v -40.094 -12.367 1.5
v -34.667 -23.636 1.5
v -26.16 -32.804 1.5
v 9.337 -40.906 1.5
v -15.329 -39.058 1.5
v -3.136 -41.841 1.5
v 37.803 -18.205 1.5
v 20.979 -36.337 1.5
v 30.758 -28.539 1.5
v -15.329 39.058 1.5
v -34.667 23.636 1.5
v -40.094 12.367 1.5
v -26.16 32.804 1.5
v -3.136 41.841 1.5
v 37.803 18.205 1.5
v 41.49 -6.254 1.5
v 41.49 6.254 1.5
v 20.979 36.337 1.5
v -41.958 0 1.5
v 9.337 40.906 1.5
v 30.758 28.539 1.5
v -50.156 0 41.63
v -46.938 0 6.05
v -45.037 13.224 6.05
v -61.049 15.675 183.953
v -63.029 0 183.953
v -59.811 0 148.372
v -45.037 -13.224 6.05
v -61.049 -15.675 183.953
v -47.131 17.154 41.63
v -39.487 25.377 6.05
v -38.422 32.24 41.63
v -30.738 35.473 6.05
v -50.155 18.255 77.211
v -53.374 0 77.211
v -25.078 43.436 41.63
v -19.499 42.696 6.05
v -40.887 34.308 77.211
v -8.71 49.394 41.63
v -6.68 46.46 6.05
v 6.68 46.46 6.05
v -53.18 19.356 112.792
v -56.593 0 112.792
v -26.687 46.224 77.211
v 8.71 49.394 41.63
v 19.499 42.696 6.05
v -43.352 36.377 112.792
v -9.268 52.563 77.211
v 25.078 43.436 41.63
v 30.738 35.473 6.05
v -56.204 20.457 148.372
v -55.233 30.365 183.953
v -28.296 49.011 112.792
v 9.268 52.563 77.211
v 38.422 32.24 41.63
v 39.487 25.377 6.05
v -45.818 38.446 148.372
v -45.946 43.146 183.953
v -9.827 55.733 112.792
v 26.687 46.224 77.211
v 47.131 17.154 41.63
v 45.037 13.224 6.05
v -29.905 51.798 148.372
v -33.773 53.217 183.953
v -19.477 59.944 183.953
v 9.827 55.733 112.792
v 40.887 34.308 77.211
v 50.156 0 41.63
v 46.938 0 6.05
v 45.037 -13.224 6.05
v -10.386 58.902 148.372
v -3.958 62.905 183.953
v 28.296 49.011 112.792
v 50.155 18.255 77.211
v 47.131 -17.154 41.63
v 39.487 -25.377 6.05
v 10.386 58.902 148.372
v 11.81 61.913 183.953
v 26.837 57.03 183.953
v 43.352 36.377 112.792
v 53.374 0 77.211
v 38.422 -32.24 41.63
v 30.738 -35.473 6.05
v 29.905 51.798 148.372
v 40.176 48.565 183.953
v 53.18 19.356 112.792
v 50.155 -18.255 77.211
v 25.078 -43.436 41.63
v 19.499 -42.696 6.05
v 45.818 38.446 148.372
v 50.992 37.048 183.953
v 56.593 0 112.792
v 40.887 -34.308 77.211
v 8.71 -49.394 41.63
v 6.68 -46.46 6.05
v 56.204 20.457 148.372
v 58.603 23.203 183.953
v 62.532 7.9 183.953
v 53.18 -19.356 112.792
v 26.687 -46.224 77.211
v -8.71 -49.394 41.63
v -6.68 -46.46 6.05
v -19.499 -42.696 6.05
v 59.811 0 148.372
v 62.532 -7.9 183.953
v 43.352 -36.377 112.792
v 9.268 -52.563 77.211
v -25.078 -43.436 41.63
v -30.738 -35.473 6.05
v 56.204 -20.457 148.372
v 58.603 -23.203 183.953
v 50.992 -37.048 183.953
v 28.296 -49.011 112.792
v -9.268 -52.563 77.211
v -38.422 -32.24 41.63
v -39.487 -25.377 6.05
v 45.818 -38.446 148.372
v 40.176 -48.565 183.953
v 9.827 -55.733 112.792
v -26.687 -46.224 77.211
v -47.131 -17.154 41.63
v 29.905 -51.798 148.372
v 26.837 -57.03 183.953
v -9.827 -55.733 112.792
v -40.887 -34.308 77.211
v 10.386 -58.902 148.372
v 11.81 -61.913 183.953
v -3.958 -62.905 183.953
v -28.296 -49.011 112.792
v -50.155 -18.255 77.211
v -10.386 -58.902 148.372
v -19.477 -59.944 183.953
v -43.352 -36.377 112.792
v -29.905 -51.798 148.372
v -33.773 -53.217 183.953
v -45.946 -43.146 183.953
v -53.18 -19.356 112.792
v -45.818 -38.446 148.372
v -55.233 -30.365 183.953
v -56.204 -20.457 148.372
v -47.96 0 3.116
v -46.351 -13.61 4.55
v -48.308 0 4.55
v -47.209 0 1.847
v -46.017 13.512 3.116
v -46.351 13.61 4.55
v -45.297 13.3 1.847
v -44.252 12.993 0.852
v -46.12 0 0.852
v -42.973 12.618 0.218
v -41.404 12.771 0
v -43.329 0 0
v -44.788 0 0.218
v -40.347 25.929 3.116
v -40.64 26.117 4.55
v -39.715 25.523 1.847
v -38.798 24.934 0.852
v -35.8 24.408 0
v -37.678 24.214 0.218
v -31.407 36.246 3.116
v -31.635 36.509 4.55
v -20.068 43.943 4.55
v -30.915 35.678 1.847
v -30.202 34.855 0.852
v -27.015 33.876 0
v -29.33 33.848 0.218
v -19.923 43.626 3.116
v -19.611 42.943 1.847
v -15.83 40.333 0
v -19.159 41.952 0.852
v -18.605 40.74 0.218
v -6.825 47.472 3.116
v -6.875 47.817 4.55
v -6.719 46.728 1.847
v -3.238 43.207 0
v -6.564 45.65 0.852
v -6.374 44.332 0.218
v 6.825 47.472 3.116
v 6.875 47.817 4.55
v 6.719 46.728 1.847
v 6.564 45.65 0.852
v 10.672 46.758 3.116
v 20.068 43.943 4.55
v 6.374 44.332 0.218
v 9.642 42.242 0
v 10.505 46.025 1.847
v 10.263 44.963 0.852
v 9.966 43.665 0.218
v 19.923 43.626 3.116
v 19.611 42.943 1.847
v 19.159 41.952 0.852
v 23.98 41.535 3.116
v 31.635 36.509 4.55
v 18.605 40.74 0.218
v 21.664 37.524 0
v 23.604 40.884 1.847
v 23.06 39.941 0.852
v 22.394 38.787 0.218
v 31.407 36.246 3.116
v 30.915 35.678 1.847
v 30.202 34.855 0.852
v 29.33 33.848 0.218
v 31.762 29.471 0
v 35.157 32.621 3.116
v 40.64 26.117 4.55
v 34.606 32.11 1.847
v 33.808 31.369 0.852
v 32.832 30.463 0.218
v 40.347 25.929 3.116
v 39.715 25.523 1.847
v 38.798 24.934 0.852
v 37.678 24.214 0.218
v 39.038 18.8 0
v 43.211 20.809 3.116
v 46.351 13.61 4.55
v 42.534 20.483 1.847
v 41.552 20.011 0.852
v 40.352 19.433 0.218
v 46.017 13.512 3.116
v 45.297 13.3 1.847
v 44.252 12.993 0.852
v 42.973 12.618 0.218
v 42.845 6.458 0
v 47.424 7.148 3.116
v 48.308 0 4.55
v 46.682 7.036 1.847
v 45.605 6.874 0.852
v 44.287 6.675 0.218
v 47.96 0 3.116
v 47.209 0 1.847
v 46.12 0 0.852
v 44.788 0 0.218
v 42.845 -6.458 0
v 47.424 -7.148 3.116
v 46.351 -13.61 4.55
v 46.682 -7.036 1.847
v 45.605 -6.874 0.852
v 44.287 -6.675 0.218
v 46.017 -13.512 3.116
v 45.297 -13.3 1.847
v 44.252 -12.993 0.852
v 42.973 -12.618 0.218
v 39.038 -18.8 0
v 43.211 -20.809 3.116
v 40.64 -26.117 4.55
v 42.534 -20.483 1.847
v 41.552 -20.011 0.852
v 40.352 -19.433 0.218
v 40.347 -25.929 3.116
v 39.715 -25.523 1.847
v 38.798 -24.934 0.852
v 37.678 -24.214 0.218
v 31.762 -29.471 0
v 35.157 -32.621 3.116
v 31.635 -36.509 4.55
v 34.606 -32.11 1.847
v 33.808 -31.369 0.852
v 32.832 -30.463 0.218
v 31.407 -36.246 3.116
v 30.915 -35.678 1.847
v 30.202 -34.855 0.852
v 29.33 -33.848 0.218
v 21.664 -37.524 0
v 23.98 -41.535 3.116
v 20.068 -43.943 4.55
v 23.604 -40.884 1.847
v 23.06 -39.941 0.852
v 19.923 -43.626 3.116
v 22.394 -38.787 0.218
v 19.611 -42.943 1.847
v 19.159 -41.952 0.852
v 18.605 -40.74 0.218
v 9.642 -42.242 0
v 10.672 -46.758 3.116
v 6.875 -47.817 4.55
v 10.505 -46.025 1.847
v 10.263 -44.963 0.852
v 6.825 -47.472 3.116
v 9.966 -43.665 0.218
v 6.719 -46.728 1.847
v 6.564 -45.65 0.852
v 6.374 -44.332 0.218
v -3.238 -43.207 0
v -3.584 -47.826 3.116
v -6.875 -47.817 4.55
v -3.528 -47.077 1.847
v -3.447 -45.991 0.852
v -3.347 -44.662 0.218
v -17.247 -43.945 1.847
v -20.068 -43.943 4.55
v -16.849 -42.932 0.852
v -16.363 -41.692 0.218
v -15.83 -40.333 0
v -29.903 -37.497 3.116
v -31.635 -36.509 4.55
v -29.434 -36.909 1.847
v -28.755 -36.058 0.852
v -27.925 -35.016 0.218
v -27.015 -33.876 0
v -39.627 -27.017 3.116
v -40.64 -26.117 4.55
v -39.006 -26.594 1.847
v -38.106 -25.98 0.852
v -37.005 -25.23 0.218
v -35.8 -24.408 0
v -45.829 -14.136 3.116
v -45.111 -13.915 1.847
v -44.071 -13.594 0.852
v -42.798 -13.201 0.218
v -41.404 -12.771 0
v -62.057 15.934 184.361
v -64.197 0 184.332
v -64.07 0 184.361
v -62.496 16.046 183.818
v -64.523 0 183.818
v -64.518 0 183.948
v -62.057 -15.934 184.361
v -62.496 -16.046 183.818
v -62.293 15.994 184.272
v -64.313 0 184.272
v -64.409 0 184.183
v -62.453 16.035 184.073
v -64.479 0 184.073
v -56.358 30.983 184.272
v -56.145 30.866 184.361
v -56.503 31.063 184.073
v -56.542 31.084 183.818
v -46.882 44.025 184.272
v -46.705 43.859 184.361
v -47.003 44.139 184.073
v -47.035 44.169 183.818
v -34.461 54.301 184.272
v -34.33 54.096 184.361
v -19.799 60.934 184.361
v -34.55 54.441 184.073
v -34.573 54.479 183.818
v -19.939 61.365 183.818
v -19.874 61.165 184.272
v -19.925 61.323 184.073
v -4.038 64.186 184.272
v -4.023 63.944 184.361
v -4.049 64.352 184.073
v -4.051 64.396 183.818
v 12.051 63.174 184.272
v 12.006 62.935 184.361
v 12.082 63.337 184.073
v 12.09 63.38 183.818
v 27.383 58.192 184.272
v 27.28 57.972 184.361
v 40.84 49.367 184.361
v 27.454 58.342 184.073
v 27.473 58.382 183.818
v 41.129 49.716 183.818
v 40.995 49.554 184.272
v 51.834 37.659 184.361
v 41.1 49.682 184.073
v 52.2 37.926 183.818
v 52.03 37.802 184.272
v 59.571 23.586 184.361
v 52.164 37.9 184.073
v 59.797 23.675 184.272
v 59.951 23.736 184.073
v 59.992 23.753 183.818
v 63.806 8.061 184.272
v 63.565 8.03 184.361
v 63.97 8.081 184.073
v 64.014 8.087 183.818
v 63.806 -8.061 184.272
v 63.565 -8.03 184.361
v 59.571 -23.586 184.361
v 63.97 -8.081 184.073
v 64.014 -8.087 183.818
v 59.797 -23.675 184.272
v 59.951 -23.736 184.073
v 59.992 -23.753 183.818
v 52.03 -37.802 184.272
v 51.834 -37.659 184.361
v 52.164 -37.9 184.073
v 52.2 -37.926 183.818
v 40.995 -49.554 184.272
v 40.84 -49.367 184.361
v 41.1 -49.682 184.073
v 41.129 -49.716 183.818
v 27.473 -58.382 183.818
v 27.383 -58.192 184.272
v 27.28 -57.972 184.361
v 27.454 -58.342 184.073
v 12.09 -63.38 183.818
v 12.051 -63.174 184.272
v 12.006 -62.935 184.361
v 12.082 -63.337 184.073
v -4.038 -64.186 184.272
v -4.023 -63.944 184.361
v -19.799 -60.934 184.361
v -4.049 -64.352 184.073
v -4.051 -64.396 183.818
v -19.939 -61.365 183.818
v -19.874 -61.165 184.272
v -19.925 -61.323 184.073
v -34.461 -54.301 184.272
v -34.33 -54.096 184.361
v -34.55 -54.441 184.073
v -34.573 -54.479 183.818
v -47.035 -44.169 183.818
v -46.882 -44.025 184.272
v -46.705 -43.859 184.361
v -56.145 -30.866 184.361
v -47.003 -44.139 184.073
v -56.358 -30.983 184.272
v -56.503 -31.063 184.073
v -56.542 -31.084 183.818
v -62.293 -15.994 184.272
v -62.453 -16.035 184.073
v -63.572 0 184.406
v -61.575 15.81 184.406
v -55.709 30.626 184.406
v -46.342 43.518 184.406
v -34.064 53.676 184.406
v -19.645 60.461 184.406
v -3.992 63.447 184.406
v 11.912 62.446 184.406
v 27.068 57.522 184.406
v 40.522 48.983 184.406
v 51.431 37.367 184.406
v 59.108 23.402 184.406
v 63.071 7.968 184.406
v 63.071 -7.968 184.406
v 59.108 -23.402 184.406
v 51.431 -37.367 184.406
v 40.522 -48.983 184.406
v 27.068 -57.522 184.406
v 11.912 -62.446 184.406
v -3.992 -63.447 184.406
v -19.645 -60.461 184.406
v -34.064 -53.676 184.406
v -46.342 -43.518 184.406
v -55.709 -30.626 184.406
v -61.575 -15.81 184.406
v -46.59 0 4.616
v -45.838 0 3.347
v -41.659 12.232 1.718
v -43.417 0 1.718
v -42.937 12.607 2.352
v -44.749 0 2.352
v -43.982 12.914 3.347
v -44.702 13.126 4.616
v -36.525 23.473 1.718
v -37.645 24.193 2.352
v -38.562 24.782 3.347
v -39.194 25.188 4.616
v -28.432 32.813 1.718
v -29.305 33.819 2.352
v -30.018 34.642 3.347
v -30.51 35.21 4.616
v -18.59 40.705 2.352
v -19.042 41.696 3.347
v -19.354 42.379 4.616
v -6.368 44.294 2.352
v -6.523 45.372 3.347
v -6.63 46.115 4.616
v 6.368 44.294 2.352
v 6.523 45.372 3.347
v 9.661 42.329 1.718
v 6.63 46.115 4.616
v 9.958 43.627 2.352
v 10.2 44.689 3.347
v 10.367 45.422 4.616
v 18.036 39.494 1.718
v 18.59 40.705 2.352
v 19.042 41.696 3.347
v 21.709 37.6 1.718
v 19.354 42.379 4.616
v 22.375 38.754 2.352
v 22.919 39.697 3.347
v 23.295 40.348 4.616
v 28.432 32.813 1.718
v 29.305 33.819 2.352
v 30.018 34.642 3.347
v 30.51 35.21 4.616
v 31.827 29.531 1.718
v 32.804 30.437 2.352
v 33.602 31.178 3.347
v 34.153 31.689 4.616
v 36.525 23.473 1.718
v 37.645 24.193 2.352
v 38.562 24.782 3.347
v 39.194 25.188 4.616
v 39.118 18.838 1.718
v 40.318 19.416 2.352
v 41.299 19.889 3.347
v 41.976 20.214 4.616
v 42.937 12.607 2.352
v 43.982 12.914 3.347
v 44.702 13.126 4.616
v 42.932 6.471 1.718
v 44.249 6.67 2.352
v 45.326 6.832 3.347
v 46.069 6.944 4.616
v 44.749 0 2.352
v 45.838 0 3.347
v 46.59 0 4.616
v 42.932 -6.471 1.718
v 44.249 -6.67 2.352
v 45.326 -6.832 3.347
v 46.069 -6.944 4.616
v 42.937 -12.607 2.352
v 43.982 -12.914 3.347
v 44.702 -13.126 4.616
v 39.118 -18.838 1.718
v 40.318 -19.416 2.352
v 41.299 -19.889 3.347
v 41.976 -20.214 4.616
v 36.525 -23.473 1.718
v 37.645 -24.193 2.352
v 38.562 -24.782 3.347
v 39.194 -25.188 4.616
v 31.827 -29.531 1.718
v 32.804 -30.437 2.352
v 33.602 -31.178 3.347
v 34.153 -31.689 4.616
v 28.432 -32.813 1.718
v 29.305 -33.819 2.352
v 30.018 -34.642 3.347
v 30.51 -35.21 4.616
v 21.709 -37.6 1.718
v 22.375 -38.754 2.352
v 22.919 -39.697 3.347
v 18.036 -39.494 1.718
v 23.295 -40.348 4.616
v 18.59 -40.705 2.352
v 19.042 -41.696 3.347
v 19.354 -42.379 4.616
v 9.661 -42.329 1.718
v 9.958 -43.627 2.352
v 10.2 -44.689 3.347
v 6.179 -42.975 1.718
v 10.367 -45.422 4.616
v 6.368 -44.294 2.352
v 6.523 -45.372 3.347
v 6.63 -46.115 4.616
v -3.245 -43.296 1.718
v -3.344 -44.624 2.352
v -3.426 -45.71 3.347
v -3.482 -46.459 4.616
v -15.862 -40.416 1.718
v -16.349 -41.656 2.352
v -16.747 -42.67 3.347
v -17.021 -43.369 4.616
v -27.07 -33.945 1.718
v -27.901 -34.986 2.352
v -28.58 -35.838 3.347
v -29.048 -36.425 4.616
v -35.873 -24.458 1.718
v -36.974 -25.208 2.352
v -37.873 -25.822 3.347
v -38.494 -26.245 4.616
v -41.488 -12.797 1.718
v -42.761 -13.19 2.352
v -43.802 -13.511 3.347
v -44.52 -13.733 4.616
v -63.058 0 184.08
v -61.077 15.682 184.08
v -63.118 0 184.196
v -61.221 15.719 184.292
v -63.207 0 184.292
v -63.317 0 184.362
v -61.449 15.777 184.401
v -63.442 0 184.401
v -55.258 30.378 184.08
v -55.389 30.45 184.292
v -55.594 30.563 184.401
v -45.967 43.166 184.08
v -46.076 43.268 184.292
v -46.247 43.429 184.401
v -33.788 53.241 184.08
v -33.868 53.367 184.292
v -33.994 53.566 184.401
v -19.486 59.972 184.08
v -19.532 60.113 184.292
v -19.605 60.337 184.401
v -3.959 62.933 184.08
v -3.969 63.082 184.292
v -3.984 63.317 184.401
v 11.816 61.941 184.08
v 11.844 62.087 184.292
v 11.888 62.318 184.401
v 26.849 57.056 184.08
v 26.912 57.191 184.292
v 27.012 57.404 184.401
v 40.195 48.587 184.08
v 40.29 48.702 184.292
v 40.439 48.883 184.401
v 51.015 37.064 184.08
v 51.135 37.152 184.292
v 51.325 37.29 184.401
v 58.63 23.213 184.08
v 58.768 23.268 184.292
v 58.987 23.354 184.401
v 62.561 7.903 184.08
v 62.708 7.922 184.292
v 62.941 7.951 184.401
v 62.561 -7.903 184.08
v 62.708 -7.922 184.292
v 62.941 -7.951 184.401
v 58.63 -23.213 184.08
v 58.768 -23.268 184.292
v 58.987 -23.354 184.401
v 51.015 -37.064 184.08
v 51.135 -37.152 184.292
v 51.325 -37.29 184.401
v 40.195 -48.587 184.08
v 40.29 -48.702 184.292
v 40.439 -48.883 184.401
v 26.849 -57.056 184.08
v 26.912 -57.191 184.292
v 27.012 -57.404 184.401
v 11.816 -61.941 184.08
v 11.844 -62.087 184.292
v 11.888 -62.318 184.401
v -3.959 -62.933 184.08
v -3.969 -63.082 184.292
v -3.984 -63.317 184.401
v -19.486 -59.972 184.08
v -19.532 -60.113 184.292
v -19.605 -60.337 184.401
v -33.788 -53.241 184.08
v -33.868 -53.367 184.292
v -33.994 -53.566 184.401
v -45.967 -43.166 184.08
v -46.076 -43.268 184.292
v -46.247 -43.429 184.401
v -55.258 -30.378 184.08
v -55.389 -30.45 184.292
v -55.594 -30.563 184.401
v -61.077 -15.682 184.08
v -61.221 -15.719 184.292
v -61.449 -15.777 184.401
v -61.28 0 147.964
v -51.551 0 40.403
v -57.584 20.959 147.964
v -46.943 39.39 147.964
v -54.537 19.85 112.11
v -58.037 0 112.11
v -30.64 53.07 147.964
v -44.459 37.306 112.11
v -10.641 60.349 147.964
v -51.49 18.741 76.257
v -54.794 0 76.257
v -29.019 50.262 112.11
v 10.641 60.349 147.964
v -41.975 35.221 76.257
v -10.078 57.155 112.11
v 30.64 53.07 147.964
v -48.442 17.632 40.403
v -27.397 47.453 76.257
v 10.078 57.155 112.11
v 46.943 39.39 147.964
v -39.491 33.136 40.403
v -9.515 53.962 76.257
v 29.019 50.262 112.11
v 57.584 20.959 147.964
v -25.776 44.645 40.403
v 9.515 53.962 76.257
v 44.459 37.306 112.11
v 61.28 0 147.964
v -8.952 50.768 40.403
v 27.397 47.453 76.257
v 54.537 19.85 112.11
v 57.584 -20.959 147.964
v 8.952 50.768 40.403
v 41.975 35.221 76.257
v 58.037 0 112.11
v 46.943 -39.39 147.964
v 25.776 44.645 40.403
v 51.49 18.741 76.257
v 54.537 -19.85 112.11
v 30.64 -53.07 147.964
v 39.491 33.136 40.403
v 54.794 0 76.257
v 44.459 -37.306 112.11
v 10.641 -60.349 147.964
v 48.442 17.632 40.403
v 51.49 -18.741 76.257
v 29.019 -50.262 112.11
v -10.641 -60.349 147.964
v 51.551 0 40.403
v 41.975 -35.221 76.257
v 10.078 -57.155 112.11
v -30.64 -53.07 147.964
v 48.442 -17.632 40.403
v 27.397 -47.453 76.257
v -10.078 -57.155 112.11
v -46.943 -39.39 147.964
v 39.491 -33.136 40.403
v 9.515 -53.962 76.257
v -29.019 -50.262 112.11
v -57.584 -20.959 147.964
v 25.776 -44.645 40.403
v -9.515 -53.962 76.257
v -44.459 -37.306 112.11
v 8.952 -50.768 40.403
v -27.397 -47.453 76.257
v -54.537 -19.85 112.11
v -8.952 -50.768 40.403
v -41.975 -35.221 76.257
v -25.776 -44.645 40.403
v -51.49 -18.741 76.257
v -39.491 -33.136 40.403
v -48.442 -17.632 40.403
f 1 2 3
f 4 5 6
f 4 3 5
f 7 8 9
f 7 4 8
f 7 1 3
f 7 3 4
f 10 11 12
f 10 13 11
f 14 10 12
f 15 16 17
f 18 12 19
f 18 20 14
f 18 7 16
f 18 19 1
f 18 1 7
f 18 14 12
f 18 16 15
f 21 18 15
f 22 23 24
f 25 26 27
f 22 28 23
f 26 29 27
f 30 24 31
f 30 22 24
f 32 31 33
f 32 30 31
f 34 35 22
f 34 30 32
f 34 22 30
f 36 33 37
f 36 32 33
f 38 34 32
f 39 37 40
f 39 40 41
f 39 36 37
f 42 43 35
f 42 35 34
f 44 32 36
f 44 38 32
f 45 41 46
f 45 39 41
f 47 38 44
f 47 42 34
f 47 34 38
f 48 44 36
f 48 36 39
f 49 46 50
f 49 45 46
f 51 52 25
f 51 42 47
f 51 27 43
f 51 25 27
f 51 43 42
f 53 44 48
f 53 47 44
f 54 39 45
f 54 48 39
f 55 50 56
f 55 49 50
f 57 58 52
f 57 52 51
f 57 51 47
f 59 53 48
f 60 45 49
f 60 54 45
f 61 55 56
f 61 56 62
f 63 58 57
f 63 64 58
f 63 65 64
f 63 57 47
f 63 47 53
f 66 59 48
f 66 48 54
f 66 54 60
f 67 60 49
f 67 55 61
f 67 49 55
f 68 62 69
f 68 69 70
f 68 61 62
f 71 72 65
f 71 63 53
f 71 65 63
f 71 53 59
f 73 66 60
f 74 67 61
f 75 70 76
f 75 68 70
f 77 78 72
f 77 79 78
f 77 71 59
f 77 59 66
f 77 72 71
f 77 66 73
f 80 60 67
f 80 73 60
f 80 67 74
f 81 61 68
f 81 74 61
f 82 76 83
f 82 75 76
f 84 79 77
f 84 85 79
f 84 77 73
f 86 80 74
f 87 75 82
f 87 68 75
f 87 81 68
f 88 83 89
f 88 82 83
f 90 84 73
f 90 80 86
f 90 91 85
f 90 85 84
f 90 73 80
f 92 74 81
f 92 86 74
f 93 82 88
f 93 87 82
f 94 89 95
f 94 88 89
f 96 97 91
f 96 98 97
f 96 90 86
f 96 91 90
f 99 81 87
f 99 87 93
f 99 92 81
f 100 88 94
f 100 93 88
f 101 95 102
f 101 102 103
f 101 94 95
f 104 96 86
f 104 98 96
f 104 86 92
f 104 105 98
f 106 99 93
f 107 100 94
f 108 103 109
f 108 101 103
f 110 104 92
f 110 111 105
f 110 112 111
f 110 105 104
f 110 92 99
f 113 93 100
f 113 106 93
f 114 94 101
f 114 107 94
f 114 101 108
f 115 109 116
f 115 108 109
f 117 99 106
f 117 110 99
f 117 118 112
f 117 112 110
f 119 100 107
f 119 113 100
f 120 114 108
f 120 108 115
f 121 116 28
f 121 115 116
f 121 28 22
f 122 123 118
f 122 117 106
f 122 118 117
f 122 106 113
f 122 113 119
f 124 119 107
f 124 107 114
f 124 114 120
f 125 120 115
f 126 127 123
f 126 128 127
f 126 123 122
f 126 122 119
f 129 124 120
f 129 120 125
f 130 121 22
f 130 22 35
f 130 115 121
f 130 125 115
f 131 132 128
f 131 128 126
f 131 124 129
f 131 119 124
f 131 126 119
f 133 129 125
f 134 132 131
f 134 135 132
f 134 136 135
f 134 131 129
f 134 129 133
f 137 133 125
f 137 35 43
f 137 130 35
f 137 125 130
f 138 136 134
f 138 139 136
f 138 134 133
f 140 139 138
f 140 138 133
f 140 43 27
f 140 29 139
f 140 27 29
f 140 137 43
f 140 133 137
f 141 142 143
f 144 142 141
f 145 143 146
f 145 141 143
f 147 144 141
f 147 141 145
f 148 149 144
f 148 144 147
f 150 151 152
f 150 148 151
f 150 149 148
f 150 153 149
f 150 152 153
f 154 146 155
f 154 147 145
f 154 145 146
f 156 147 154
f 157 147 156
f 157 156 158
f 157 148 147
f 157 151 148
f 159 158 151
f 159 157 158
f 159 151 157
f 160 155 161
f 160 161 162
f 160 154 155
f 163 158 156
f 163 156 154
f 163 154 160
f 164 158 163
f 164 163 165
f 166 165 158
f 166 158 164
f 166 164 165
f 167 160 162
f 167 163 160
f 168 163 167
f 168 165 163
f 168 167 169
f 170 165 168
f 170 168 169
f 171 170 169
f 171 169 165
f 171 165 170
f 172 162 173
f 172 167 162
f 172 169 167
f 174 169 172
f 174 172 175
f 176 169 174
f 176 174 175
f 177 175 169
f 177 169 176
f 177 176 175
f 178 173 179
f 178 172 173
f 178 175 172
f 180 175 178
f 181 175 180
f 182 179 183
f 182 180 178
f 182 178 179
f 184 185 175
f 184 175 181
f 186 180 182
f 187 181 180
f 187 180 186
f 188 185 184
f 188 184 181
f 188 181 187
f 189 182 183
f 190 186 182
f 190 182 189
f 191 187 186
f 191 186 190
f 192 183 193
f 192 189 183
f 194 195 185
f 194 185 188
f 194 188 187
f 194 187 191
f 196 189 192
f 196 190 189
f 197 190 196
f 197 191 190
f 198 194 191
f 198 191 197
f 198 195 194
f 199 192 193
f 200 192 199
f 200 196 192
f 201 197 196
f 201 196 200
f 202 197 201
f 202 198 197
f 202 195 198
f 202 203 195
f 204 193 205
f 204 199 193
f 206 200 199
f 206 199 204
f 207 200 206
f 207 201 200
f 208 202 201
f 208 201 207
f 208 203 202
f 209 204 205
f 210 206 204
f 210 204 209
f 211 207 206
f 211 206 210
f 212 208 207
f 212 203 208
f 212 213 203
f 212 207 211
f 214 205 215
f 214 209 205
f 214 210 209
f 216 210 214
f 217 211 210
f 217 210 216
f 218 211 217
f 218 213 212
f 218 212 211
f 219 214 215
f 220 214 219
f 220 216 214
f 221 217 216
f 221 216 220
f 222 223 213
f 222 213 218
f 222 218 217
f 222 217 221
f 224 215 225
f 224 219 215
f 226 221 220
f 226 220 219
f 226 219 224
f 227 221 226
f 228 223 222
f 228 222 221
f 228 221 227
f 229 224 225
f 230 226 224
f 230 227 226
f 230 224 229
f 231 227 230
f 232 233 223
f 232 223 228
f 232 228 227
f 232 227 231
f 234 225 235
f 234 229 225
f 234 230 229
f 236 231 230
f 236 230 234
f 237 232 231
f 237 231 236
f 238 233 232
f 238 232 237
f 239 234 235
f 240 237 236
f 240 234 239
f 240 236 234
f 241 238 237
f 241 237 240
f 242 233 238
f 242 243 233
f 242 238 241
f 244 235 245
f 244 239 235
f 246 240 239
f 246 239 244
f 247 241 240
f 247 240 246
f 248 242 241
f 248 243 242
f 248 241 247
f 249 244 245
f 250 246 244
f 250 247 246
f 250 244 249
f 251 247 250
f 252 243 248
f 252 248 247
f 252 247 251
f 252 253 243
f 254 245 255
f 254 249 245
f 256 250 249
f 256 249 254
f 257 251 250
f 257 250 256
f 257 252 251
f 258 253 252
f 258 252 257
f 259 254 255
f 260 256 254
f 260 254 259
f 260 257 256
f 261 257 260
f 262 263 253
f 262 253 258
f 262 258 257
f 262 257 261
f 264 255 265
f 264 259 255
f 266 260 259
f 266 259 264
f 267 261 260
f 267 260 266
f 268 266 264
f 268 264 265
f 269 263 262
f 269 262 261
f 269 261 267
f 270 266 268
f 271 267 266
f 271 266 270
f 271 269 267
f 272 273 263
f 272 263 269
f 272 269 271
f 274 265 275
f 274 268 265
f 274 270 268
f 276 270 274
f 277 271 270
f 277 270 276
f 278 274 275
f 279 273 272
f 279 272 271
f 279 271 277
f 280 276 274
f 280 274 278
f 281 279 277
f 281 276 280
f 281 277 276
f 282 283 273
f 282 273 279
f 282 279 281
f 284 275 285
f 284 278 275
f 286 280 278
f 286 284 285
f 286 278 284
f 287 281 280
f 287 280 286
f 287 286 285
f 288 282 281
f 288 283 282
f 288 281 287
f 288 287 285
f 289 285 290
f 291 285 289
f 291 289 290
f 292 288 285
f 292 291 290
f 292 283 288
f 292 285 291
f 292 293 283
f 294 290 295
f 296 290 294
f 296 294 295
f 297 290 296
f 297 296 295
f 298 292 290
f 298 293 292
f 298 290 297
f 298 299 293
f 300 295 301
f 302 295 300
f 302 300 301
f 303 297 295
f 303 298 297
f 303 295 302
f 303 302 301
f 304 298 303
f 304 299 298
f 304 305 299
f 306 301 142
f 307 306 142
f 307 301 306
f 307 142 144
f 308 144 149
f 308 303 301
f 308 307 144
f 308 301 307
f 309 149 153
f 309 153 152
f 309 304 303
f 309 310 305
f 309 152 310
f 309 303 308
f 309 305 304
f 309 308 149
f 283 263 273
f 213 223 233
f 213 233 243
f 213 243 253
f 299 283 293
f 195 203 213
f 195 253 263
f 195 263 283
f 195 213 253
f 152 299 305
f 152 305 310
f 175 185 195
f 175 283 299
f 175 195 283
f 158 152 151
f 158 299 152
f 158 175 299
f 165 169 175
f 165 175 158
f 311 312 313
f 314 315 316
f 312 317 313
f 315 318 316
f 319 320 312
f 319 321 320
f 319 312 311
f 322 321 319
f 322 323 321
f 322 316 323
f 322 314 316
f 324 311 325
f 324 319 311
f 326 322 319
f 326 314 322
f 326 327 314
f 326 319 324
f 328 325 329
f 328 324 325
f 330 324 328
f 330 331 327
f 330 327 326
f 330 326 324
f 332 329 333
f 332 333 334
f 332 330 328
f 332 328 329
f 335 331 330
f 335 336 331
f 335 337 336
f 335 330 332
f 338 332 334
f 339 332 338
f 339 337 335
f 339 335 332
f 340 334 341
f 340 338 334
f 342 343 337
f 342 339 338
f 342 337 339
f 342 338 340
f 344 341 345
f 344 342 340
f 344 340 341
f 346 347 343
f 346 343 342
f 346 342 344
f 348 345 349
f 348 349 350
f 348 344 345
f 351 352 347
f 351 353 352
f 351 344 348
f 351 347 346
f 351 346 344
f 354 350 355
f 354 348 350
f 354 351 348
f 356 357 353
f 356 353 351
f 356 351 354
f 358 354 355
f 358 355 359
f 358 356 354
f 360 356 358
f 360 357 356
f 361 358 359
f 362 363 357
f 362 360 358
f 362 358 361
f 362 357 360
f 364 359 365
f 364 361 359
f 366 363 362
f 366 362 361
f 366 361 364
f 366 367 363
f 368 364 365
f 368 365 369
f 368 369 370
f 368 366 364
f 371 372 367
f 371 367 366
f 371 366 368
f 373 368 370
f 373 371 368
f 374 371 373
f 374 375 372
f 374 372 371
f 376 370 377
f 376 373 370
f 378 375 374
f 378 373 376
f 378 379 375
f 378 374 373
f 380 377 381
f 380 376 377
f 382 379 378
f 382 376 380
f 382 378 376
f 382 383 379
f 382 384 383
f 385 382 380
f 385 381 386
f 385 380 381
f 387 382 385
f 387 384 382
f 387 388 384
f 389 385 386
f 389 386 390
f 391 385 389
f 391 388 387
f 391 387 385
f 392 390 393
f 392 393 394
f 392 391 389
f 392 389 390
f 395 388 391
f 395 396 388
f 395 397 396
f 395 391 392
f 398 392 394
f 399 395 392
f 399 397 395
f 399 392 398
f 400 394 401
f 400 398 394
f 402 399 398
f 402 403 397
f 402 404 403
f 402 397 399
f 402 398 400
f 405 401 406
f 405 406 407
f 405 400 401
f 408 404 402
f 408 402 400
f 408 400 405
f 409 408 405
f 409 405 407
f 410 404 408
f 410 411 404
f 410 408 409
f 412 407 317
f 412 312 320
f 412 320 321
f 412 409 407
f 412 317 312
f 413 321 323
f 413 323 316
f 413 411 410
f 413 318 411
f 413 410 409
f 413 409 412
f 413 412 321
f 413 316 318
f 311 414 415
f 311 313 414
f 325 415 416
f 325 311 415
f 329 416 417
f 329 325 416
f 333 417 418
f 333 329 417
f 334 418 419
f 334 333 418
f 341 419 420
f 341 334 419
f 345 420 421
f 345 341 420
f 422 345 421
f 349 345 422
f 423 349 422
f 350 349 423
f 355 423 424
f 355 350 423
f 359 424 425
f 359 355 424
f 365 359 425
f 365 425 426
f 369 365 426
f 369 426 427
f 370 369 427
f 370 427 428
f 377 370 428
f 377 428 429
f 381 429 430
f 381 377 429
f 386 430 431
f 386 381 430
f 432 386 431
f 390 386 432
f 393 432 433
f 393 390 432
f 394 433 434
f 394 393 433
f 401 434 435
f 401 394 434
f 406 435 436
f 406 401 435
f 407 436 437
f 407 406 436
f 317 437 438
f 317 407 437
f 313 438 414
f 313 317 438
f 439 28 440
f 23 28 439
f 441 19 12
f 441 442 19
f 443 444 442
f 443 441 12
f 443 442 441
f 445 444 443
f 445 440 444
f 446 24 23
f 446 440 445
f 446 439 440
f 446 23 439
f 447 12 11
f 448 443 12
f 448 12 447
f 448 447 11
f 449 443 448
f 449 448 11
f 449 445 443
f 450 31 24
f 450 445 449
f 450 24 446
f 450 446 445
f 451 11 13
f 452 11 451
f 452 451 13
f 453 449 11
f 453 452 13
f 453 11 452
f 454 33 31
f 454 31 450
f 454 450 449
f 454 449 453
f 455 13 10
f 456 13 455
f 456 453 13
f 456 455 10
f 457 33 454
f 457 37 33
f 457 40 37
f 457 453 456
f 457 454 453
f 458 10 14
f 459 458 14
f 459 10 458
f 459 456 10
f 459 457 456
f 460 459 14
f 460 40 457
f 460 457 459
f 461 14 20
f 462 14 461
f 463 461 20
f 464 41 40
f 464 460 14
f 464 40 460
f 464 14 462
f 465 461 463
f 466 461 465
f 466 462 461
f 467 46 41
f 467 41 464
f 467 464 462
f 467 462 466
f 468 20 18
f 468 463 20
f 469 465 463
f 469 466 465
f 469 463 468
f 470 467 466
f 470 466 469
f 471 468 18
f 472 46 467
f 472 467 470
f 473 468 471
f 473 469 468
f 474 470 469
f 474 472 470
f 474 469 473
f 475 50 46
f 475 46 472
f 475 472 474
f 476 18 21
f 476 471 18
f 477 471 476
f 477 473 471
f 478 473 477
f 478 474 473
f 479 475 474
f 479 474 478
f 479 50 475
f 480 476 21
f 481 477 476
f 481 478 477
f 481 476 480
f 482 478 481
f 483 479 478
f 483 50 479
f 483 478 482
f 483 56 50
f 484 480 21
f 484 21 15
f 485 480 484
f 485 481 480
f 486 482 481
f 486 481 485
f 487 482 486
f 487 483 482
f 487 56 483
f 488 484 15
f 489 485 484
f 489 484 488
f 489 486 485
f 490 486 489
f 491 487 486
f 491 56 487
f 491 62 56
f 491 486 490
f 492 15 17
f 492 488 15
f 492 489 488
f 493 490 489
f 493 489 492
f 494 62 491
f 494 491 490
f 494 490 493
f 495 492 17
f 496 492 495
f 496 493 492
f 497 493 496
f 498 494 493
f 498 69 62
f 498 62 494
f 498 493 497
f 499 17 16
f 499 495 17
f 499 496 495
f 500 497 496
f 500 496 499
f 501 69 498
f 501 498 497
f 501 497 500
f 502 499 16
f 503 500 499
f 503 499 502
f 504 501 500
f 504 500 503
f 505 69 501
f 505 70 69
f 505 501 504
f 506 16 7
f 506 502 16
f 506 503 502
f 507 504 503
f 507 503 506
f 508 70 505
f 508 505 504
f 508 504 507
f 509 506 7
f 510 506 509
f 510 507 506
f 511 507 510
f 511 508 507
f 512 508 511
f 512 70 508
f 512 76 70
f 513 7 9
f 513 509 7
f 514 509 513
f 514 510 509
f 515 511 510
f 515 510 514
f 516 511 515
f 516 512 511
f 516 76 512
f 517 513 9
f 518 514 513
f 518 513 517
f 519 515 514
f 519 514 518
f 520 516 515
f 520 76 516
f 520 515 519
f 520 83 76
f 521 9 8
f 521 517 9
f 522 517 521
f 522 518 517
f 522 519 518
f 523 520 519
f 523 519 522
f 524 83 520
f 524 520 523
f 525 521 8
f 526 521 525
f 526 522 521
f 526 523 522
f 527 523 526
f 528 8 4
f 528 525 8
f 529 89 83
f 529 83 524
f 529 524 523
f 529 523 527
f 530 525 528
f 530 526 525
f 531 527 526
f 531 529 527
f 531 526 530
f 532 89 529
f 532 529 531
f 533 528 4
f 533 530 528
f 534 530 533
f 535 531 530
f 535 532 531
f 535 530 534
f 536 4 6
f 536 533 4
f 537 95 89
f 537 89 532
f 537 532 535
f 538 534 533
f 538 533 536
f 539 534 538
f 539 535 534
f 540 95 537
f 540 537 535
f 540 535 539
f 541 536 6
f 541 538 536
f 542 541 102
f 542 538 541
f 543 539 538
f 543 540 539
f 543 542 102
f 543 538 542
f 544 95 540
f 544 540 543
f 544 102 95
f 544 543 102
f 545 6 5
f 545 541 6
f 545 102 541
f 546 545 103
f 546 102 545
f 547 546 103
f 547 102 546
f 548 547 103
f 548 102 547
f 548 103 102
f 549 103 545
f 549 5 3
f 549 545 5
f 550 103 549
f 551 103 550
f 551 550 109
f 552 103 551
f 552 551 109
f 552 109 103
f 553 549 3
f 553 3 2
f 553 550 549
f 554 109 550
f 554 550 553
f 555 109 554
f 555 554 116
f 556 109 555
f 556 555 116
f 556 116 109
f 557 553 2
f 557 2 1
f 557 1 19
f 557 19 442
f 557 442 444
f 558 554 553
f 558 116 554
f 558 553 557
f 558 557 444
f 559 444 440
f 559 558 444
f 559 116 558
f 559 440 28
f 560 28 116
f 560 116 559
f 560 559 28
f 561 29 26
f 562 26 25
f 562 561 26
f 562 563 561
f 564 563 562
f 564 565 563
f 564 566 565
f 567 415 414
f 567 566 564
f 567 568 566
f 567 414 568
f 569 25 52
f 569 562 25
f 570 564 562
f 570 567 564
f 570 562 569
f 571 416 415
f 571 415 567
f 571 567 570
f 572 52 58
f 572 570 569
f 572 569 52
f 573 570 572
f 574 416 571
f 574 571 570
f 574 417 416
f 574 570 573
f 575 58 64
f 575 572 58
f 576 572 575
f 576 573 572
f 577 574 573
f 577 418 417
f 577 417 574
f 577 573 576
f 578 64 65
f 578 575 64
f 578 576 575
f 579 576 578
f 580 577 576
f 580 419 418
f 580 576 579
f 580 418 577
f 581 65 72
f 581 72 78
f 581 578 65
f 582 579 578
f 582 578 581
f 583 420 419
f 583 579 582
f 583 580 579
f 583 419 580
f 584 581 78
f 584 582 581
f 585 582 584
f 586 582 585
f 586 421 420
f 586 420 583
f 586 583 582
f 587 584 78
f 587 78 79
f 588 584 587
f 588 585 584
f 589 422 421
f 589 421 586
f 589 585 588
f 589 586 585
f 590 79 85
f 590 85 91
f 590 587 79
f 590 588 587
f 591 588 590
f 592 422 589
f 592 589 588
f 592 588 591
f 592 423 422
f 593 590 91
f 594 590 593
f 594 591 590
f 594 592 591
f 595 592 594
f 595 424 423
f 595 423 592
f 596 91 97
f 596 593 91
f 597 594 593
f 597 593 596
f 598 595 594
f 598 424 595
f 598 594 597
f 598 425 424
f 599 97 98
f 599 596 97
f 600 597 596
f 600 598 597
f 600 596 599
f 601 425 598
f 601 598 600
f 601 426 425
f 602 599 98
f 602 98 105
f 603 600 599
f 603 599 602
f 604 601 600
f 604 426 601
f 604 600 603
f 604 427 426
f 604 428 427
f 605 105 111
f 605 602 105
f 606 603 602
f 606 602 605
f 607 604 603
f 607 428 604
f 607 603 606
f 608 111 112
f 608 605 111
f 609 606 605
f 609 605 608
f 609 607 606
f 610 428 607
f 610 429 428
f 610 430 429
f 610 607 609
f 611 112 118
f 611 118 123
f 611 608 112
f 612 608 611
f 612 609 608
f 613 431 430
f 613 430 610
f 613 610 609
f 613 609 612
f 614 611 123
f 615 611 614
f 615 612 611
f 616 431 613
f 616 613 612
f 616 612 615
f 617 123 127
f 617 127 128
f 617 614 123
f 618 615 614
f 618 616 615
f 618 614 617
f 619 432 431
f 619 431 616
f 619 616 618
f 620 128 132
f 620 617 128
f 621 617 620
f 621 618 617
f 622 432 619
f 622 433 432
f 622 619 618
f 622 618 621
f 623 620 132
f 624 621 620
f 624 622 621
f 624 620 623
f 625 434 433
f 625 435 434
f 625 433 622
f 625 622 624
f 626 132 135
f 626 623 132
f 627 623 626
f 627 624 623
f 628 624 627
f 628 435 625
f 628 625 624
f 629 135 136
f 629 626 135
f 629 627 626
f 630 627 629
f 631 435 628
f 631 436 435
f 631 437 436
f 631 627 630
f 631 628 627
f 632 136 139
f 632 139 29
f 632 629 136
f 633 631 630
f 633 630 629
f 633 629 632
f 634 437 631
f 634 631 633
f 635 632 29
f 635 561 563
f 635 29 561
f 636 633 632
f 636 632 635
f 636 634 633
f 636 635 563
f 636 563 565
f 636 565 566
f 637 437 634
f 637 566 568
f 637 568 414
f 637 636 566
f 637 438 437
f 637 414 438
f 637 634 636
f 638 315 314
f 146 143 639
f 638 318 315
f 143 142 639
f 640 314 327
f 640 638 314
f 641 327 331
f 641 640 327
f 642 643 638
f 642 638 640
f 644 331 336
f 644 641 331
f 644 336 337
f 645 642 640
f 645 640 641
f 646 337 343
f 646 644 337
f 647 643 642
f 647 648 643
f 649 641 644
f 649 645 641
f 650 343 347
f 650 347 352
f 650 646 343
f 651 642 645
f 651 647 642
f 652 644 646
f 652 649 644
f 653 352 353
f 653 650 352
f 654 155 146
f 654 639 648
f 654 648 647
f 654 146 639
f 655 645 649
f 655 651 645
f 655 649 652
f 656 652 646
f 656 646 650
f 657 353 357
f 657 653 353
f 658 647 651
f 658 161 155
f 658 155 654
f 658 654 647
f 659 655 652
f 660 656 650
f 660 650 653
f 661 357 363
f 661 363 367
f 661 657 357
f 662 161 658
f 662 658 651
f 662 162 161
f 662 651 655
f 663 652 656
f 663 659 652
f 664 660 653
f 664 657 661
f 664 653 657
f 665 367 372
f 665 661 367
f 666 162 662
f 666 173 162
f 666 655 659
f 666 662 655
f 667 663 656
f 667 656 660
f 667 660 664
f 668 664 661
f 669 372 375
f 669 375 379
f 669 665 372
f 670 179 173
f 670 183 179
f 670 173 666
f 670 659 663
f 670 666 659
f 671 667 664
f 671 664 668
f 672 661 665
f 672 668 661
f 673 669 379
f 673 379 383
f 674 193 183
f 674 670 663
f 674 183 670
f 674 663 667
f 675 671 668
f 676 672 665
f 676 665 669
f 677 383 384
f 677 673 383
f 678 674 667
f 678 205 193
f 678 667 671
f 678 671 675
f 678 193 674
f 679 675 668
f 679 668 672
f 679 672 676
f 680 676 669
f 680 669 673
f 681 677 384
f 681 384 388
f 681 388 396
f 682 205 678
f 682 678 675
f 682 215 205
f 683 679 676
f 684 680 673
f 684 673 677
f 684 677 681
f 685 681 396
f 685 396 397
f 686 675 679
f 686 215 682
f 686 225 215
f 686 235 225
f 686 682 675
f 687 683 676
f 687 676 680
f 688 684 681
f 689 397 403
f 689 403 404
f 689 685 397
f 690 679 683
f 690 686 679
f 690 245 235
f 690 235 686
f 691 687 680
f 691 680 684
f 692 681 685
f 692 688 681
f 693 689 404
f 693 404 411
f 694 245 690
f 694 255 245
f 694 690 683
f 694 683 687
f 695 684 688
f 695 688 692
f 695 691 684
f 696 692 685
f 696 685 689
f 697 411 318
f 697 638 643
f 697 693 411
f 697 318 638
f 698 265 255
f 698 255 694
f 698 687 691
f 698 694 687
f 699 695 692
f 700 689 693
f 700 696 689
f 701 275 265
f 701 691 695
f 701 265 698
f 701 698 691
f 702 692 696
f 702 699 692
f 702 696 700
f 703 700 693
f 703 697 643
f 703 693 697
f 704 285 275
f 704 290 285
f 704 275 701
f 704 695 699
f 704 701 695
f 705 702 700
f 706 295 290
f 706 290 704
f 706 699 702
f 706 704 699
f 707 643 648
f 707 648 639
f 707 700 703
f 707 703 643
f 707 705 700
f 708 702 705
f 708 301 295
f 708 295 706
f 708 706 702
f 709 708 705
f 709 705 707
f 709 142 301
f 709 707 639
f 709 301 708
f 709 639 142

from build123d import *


with BuildPart() as f1:
    # F0 (on Front) → F1 (revolve)
    with BuildSketch(Plane.XZ):
        with BuildLine():
            Line((-43.328613, 0), (0, 0))
            Line((0, 0), (0, 1.5))
            Line((0, 1.5), (-41.958164, 1.5))
            ThreePointArc((-41.958164, 1.5), (-45.330697, 2.808655), (-46.937836, 6.04959))
            Line((-46.937836, 6.04959), (-63.029157, 183.952895))
            ThreePointArc((-63.029157, 183.952895), (-63.206857, 184.291819), (-63.572165, 184.405821))
            Line((-63.572165, 184.405821), (-64.070132, 184.36078))
            ThreePointArc((-64.070132, 184.36078), (-64.409056, 184.18308), (-64.523058, 183.817772))
            Line((-64.523058, 183.817772), (-48.308285, 4.54959))
            ThreePointArc((-48.308285, 4.54959), (-46.701145, 1.308655), (-43.328613, 0))
        make_face()
    revolve(axis=Axis((0, 0, 0.75), (0, 0, -1)))


solid = f1.part
